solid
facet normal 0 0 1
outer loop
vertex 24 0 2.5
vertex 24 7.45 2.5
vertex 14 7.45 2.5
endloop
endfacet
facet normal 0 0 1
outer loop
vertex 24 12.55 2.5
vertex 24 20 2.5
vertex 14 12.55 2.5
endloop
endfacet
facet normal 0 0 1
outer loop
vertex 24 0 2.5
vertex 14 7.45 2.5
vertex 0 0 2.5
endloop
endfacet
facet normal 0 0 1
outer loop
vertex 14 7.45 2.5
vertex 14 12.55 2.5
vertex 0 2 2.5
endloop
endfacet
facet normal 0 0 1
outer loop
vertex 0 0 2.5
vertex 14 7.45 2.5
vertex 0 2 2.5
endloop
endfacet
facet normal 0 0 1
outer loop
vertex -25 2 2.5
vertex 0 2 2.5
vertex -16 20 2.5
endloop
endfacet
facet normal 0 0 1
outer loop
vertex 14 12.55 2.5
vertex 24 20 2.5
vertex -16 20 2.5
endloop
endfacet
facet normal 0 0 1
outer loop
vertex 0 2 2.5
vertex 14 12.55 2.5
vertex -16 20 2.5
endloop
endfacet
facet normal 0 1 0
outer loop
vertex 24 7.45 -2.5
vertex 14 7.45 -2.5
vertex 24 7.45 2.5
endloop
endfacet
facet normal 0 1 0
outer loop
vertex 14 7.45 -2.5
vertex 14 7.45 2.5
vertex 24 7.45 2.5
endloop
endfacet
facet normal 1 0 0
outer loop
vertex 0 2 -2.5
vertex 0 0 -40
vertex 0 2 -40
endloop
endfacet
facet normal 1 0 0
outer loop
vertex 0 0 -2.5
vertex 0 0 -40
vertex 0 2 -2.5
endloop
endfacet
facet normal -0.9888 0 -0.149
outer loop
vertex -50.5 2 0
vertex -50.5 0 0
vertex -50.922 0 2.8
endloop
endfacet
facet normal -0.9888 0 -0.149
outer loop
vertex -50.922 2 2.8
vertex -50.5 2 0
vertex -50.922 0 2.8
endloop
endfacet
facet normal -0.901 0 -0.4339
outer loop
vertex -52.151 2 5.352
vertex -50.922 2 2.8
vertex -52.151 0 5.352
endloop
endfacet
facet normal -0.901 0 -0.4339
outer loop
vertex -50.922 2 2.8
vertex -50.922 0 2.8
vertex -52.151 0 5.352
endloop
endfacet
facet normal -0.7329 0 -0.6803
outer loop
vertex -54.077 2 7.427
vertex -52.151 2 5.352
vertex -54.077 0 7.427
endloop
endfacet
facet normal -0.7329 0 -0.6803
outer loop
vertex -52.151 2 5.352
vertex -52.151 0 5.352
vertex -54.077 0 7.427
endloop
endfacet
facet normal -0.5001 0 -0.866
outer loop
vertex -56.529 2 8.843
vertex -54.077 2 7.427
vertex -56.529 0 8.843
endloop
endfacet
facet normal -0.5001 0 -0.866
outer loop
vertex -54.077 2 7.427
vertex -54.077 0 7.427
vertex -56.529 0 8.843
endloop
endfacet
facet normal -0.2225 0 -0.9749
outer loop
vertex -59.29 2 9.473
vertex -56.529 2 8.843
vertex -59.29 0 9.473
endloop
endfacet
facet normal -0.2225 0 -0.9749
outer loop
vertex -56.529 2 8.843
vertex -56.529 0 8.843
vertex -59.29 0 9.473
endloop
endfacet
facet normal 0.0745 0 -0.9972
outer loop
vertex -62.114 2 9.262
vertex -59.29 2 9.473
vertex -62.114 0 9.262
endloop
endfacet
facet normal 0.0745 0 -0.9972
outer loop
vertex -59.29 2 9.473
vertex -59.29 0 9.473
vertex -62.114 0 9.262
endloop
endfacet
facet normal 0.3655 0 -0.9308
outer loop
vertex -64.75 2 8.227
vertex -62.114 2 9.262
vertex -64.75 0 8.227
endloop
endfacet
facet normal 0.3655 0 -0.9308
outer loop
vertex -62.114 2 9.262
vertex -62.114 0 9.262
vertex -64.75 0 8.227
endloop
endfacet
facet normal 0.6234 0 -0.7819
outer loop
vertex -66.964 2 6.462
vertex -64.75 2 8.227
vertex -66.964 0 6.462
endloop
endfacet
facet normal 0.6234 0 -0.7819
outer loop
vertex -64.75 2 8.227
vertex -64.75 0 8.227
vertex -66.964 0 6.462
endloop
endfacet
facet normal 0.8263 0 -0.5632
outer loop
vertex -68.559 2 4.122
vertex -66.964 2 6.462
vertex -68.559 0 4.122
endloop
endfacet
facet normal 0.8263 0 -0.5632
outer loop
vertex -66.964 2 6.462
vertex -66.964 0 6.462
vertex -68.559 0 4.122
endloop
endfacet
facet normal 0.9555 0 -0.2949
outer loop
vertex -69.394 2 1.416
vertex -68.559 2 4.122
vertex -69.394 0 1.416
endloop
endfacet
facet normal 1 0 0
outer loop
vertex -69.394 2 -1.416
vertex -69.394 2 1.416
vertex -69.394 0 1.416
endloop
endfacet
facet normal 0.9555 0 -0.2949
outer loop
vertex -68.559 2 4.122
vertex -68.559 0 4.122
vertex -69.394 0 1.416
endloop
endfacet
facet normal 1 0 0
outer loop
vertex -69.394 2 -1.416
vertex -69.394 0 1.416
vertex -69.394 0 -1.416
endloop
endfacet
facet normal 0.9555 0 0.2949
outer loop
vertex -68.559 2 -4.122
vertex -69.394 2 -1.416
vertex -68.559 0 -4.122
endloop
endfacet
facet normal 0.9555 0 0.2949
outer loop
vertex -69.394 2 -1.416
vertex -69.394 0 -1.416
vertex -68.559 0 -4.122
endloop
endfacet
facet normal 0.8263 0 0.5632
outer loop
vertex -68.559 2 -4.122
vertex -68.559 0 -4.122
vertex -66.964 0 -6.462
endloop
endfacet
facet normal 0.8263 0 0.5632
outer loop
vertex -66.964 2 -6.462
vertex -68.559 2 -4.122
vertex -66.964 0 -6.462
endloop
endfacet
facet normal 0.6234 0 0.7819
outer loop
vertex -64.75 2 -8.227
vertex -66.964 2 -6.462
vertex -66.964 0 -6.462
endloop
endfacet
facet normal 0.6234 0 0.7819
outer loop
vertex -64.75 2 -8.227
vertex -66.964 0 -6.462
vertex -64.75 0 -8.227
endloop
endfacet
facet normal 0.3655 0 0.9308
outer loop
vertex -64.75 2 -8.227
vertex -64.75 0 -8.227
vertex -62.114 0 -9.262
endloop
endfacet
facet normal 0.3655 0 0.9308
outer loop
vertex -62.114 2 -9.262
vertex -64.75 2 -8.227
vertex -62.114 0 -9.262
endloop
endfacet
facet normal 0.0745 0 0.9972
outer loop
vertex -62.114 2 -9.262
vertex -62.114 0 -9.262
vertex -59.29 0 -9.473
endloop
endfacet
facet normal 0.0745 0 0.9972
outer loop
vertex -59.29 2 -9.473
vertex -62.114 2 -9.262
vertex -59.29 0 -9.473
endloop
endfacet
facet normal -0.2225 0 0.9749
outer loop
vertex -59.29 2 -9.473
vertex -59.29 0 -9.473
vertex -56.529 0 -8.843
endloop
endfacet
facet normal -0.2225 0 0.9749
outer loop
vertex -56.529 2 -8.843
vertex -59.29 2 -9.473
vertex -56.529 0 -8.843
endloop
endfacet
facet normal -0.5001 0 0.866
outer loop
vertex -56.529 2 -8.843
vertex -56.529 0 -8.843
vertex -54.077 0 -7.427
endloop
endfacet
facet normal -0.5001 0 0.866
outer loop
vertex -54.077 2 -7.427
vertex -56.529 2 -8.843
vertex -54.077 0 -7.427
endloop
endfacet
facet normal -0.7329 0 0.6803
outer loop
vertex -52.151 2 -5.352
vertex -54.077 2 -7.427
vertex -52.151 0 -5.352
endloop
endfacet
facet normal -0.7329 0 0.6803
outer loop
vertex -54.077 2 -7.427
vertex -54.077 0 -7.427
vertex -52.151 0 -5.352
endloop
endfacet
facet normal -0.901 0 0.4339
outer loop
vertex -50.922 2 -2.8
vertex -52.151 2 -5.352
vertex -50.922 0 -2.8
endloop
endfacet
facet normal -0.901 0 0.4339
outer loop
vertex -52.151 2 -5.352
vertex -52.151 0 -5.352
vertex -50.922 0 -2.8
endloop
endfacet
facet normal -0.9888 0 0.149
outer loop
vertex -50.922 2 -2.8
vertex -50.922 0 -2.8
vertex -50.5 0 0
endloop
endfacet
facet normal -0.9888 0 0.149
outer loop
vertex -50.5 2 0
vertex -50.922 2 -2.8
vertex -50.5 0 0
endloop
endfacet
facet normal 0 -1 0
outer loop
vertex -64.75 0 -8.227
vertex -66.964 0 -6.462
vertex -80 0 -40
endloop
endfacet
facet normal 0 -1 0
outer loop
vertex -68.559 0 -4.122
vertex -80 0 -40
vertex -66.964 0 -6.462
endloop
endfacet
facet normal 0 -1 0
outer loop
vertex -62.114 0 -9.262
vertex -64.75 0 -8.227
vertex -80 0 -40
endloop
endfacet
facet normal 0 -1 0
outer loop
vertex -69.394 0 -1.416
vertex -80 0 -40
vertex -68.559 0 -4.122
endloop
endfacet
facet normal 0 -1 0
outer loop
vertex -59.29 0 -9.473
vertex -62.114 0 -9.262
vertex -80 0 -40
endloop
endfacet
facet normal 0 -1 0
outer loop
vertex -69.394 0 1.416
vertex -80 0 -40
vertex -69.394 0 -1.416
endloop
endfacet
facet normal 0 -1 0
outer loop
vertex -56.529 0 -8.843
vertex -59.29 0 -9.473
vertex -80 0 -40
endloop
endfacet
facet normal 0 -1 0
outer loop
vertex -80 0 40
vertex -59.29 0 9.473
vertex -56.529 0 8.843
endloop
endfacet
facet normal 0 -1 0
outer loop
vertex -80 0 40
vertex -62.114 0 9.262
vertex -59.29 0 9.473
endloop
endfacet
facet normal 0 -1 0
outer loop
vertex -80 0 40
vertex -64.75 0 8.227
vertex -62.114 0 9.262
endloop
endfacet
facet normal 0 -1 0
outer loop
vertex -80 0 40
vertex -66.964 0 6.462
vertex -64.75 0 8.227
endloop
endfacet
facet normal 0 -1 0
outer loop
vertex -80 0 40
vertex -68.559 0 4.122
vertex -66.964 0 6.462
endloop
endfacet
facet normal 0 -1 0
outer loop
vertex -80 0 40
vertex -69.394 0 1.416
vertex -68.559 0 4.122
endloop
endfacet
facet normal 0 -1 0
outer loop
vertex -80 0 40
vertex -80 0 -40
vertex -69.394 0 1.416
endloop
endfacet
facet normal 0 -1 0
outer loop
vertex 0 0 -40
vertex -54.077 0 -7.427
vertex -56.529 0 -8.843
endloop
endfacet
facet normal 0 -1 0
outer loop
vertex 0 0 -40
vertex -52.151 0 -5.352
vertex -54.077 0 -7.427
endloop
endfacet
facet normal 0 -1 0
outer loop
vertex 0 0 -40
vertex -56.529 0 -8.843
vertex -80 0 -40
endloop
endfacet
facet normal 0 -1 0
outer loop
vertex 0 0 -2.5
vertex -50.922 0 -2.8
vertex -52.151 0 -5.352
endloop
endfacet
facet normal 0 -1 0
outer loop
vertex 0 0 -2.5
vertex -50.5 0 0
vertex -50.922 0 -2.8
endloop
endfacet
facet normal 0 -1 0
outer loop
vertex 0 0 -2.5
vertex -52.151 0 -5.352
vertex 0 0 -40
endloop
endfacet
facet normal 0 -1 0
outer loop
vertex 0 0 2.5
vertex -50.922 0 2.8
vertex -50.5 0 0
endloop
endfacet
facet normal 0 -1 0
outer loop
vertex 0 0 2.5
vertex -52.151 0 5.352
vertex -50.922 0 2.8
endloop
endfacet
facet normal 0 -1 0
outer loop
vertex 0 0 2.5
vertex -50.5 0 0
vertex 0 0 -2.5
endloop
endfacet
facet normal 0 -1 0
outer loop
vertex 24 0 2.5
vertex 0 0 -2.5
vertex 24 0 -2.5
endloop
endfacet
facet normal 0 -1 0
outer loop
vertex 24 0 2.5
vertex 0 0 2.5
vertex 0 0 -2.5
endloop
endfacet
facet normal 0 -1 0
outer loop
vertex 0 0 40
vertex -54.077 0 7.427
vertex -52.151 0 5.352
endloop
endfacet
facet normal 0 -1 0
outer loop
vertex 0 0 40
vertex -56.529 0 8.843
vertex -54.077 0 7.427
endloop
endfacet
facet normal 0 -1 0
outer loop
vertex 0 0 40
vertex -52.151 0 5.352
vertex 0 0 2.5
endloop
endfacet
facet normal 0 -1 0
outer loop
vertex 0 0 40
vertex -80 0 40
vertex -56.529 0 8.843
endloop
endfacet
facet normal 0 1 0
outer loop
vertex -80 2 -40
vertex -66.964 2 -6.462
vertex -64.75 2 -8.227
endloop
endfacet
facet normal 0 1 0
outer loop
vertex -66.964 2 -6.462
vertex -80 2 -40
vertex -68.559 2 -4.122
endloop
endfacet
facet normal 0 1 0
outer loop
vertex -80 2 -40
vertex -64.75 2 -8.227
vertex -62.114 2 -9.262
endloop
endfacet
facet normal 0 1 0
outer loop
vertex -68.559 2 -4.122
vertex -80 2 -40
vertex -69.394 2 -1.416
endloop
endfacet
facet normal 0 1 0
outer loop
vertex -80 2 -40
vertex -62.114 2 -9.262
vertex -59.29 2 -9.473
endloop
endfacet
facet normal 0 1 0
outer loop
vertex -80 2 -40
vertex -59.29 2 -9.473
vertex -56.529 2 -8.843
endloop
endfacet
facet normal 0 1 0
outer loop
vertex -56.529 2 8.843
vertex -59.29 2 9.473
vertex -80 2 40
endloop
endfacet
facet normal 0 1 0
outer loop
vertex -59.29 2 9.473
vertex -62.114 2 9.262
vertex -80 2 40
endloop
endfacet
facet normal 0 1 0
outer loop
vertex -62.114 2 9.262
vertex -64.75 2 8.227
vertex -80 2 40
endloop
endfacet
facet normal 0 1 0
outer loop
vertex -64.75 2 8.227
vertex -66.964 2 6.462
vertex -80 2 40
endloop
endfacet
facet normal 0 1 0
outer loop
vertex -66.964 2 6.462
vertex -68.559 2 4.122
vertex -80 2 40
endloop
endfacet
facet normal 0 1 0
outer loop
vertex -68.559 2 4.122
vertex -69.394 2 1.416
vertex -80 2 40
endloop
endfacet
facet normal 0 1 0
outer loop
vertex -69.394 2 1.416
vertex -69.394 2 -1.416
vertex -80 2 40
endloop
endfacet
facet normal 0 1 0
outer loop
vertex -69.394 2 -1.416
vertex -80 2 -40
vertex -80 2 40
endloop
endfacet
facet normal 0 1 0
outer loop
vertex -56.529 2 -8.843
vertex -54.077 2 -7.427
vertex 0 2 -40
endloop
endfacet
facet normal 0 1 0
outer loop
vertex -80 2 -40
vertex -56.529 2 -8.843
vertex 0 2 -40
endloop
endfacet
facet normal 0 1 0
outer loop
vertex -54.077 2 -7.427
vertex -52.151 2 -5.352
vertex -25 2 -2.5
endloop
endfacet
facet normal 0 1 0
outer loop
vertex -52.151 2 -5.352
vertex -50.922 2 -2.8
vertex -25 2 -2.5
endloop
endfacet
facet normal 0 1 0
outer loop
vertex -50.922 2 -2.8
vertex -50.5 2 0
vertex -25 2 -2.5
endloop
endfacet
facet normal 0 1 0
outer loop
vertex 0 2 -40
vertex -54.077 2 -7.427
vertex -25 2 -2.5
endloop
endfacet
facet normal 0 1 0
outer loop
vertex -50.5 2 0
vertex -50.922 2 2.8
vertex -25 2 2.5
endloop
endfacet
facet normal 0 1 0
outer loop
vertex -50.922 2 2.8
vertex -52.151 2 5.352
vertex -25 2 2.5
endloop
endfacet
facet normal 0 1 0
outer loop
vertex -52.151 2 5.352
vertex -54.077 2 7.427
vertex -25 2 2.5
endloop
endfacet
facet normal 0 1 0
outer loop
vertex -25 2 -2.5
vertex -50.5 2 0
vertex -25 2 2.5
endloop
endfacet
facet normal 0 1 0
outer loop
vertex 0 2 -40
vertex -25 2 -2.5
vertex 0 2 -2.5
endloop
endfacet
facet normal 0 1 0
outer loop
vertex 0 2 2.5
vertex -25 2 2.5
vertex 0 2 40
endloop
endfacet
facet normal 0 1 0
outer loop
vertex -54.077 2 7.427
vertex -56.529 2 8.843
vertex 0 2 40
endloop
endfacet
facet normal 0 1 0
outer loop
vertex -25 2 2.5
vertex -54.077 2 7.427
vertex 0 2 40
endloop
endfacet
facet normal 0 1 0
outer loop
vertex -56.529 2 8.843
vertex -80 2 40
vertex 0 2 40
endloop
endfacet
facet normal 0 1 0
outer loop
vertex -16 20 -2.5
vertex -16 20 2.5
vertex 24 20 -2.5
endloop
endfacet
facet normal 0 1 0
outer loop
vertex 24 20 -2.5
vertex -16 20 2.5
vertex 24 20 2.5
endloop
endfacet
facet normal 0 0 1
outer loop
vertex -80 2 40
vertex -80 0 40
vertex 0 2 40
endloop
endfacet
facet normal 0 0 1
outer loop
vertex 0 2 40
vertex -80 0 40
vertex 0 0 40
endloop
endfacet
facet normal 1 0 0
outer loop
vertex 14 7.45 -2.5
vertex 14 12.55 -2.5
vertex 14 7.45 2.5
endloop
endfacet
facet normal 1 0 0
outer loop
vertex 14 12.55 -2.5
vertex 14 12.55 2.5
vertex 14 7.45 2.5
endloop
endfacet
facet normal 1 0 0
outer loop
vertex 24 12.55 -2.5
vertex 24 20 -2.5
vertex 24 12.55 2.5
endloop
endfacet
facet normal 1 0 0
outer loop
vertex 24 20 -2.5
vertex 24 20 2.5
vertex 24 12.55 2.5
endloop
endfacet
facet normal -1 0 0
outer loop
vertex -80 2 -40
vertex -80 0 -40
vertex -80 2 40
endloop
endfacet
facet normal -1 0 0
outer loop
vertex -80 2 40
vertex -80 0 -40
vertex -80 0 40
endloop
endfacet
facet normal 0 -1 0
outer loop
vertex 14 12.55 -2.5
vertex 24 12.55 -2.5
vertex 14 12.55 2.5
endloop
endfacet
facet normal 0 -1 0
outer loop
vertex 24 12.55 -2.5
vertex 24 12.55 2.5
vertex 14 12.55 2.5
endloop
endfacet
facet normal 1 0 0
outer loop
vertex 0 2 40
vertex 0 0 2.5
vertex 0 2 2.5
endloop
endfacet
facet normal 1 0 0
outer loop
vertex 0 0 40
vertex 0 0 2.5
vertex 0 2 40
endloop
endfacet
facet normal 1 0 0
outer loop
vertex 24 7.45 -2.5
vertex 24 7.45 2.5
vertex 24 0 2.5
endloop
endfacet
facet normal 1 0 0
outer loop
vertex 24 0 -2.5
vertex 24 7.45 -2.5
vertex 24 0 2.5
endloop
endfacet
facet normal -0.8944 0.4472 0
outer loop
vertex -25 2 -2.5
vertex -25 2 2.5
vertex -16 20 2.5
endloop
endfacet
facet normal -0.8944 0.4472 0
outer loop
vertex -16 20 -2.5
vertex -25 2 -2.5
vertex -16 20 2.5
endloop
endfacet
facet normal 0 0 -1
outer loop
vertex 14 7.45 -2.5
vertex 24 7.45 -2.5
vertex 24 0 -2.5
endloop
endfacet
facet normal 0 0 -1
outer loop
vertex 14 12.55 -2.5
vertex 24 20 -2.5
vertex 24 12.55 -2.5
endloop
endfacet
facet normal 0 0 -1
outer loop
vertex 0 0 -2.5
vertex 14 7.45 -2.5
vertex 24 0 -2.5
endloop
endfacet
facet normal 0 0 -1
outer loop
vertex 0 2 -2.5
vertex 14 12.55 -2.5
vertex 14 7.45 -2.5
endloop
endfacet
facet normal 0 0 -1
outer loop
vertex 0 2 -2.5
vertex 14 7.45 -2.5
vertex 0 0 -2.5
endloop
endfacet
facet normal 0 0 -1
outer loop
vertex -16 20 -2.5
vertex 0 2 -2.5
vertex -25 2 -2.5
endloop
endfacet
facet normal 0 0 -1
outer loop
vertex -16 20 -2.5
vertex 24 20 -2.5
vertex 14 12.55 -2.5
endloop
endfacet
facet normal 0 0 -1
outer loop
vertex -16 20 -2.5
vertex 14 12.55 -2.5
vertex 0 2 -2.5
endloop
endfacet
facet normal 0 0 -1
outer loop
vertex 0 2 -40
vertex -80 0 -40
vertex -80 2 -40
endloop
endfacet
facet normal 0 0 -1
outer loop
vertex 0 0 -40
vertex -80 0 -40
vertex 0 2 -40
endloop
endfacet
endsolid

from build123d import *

# Parameters (mm, degrees)
SKETCH_W     = 80
SKETCH_H     = 80
SKETCH_R     = 9.5
PAD_DEPTH    = 2
PAD001_DEPTH = 2.5


with BuildPart() as part:
    # Sketch → Pad (new body)
    with BuildSketch(Plane.XZ):
        with Locations((-40, 0)):
            Rectangle(SKETCH_W, SKETCH_H)
        with Locations((-60, 0)):
            Circle(SKETCH_R, mode=Mode.SUBTRACT)
    extrude(amount=-PAD_DEPTH)

    # Sketch001 → Pad001 (join, symmetric)
    with BuildSketch(Plane.XY):
        Polygon((-26, 0), (-16, 20), (24, 20), (24, 12.55), (14, 12.55), (14, 7.45), (24, 7.45), (24, 0), align=None)
    extrude(amount=PAD001_DEPTH, both=True)


solid = part.part
